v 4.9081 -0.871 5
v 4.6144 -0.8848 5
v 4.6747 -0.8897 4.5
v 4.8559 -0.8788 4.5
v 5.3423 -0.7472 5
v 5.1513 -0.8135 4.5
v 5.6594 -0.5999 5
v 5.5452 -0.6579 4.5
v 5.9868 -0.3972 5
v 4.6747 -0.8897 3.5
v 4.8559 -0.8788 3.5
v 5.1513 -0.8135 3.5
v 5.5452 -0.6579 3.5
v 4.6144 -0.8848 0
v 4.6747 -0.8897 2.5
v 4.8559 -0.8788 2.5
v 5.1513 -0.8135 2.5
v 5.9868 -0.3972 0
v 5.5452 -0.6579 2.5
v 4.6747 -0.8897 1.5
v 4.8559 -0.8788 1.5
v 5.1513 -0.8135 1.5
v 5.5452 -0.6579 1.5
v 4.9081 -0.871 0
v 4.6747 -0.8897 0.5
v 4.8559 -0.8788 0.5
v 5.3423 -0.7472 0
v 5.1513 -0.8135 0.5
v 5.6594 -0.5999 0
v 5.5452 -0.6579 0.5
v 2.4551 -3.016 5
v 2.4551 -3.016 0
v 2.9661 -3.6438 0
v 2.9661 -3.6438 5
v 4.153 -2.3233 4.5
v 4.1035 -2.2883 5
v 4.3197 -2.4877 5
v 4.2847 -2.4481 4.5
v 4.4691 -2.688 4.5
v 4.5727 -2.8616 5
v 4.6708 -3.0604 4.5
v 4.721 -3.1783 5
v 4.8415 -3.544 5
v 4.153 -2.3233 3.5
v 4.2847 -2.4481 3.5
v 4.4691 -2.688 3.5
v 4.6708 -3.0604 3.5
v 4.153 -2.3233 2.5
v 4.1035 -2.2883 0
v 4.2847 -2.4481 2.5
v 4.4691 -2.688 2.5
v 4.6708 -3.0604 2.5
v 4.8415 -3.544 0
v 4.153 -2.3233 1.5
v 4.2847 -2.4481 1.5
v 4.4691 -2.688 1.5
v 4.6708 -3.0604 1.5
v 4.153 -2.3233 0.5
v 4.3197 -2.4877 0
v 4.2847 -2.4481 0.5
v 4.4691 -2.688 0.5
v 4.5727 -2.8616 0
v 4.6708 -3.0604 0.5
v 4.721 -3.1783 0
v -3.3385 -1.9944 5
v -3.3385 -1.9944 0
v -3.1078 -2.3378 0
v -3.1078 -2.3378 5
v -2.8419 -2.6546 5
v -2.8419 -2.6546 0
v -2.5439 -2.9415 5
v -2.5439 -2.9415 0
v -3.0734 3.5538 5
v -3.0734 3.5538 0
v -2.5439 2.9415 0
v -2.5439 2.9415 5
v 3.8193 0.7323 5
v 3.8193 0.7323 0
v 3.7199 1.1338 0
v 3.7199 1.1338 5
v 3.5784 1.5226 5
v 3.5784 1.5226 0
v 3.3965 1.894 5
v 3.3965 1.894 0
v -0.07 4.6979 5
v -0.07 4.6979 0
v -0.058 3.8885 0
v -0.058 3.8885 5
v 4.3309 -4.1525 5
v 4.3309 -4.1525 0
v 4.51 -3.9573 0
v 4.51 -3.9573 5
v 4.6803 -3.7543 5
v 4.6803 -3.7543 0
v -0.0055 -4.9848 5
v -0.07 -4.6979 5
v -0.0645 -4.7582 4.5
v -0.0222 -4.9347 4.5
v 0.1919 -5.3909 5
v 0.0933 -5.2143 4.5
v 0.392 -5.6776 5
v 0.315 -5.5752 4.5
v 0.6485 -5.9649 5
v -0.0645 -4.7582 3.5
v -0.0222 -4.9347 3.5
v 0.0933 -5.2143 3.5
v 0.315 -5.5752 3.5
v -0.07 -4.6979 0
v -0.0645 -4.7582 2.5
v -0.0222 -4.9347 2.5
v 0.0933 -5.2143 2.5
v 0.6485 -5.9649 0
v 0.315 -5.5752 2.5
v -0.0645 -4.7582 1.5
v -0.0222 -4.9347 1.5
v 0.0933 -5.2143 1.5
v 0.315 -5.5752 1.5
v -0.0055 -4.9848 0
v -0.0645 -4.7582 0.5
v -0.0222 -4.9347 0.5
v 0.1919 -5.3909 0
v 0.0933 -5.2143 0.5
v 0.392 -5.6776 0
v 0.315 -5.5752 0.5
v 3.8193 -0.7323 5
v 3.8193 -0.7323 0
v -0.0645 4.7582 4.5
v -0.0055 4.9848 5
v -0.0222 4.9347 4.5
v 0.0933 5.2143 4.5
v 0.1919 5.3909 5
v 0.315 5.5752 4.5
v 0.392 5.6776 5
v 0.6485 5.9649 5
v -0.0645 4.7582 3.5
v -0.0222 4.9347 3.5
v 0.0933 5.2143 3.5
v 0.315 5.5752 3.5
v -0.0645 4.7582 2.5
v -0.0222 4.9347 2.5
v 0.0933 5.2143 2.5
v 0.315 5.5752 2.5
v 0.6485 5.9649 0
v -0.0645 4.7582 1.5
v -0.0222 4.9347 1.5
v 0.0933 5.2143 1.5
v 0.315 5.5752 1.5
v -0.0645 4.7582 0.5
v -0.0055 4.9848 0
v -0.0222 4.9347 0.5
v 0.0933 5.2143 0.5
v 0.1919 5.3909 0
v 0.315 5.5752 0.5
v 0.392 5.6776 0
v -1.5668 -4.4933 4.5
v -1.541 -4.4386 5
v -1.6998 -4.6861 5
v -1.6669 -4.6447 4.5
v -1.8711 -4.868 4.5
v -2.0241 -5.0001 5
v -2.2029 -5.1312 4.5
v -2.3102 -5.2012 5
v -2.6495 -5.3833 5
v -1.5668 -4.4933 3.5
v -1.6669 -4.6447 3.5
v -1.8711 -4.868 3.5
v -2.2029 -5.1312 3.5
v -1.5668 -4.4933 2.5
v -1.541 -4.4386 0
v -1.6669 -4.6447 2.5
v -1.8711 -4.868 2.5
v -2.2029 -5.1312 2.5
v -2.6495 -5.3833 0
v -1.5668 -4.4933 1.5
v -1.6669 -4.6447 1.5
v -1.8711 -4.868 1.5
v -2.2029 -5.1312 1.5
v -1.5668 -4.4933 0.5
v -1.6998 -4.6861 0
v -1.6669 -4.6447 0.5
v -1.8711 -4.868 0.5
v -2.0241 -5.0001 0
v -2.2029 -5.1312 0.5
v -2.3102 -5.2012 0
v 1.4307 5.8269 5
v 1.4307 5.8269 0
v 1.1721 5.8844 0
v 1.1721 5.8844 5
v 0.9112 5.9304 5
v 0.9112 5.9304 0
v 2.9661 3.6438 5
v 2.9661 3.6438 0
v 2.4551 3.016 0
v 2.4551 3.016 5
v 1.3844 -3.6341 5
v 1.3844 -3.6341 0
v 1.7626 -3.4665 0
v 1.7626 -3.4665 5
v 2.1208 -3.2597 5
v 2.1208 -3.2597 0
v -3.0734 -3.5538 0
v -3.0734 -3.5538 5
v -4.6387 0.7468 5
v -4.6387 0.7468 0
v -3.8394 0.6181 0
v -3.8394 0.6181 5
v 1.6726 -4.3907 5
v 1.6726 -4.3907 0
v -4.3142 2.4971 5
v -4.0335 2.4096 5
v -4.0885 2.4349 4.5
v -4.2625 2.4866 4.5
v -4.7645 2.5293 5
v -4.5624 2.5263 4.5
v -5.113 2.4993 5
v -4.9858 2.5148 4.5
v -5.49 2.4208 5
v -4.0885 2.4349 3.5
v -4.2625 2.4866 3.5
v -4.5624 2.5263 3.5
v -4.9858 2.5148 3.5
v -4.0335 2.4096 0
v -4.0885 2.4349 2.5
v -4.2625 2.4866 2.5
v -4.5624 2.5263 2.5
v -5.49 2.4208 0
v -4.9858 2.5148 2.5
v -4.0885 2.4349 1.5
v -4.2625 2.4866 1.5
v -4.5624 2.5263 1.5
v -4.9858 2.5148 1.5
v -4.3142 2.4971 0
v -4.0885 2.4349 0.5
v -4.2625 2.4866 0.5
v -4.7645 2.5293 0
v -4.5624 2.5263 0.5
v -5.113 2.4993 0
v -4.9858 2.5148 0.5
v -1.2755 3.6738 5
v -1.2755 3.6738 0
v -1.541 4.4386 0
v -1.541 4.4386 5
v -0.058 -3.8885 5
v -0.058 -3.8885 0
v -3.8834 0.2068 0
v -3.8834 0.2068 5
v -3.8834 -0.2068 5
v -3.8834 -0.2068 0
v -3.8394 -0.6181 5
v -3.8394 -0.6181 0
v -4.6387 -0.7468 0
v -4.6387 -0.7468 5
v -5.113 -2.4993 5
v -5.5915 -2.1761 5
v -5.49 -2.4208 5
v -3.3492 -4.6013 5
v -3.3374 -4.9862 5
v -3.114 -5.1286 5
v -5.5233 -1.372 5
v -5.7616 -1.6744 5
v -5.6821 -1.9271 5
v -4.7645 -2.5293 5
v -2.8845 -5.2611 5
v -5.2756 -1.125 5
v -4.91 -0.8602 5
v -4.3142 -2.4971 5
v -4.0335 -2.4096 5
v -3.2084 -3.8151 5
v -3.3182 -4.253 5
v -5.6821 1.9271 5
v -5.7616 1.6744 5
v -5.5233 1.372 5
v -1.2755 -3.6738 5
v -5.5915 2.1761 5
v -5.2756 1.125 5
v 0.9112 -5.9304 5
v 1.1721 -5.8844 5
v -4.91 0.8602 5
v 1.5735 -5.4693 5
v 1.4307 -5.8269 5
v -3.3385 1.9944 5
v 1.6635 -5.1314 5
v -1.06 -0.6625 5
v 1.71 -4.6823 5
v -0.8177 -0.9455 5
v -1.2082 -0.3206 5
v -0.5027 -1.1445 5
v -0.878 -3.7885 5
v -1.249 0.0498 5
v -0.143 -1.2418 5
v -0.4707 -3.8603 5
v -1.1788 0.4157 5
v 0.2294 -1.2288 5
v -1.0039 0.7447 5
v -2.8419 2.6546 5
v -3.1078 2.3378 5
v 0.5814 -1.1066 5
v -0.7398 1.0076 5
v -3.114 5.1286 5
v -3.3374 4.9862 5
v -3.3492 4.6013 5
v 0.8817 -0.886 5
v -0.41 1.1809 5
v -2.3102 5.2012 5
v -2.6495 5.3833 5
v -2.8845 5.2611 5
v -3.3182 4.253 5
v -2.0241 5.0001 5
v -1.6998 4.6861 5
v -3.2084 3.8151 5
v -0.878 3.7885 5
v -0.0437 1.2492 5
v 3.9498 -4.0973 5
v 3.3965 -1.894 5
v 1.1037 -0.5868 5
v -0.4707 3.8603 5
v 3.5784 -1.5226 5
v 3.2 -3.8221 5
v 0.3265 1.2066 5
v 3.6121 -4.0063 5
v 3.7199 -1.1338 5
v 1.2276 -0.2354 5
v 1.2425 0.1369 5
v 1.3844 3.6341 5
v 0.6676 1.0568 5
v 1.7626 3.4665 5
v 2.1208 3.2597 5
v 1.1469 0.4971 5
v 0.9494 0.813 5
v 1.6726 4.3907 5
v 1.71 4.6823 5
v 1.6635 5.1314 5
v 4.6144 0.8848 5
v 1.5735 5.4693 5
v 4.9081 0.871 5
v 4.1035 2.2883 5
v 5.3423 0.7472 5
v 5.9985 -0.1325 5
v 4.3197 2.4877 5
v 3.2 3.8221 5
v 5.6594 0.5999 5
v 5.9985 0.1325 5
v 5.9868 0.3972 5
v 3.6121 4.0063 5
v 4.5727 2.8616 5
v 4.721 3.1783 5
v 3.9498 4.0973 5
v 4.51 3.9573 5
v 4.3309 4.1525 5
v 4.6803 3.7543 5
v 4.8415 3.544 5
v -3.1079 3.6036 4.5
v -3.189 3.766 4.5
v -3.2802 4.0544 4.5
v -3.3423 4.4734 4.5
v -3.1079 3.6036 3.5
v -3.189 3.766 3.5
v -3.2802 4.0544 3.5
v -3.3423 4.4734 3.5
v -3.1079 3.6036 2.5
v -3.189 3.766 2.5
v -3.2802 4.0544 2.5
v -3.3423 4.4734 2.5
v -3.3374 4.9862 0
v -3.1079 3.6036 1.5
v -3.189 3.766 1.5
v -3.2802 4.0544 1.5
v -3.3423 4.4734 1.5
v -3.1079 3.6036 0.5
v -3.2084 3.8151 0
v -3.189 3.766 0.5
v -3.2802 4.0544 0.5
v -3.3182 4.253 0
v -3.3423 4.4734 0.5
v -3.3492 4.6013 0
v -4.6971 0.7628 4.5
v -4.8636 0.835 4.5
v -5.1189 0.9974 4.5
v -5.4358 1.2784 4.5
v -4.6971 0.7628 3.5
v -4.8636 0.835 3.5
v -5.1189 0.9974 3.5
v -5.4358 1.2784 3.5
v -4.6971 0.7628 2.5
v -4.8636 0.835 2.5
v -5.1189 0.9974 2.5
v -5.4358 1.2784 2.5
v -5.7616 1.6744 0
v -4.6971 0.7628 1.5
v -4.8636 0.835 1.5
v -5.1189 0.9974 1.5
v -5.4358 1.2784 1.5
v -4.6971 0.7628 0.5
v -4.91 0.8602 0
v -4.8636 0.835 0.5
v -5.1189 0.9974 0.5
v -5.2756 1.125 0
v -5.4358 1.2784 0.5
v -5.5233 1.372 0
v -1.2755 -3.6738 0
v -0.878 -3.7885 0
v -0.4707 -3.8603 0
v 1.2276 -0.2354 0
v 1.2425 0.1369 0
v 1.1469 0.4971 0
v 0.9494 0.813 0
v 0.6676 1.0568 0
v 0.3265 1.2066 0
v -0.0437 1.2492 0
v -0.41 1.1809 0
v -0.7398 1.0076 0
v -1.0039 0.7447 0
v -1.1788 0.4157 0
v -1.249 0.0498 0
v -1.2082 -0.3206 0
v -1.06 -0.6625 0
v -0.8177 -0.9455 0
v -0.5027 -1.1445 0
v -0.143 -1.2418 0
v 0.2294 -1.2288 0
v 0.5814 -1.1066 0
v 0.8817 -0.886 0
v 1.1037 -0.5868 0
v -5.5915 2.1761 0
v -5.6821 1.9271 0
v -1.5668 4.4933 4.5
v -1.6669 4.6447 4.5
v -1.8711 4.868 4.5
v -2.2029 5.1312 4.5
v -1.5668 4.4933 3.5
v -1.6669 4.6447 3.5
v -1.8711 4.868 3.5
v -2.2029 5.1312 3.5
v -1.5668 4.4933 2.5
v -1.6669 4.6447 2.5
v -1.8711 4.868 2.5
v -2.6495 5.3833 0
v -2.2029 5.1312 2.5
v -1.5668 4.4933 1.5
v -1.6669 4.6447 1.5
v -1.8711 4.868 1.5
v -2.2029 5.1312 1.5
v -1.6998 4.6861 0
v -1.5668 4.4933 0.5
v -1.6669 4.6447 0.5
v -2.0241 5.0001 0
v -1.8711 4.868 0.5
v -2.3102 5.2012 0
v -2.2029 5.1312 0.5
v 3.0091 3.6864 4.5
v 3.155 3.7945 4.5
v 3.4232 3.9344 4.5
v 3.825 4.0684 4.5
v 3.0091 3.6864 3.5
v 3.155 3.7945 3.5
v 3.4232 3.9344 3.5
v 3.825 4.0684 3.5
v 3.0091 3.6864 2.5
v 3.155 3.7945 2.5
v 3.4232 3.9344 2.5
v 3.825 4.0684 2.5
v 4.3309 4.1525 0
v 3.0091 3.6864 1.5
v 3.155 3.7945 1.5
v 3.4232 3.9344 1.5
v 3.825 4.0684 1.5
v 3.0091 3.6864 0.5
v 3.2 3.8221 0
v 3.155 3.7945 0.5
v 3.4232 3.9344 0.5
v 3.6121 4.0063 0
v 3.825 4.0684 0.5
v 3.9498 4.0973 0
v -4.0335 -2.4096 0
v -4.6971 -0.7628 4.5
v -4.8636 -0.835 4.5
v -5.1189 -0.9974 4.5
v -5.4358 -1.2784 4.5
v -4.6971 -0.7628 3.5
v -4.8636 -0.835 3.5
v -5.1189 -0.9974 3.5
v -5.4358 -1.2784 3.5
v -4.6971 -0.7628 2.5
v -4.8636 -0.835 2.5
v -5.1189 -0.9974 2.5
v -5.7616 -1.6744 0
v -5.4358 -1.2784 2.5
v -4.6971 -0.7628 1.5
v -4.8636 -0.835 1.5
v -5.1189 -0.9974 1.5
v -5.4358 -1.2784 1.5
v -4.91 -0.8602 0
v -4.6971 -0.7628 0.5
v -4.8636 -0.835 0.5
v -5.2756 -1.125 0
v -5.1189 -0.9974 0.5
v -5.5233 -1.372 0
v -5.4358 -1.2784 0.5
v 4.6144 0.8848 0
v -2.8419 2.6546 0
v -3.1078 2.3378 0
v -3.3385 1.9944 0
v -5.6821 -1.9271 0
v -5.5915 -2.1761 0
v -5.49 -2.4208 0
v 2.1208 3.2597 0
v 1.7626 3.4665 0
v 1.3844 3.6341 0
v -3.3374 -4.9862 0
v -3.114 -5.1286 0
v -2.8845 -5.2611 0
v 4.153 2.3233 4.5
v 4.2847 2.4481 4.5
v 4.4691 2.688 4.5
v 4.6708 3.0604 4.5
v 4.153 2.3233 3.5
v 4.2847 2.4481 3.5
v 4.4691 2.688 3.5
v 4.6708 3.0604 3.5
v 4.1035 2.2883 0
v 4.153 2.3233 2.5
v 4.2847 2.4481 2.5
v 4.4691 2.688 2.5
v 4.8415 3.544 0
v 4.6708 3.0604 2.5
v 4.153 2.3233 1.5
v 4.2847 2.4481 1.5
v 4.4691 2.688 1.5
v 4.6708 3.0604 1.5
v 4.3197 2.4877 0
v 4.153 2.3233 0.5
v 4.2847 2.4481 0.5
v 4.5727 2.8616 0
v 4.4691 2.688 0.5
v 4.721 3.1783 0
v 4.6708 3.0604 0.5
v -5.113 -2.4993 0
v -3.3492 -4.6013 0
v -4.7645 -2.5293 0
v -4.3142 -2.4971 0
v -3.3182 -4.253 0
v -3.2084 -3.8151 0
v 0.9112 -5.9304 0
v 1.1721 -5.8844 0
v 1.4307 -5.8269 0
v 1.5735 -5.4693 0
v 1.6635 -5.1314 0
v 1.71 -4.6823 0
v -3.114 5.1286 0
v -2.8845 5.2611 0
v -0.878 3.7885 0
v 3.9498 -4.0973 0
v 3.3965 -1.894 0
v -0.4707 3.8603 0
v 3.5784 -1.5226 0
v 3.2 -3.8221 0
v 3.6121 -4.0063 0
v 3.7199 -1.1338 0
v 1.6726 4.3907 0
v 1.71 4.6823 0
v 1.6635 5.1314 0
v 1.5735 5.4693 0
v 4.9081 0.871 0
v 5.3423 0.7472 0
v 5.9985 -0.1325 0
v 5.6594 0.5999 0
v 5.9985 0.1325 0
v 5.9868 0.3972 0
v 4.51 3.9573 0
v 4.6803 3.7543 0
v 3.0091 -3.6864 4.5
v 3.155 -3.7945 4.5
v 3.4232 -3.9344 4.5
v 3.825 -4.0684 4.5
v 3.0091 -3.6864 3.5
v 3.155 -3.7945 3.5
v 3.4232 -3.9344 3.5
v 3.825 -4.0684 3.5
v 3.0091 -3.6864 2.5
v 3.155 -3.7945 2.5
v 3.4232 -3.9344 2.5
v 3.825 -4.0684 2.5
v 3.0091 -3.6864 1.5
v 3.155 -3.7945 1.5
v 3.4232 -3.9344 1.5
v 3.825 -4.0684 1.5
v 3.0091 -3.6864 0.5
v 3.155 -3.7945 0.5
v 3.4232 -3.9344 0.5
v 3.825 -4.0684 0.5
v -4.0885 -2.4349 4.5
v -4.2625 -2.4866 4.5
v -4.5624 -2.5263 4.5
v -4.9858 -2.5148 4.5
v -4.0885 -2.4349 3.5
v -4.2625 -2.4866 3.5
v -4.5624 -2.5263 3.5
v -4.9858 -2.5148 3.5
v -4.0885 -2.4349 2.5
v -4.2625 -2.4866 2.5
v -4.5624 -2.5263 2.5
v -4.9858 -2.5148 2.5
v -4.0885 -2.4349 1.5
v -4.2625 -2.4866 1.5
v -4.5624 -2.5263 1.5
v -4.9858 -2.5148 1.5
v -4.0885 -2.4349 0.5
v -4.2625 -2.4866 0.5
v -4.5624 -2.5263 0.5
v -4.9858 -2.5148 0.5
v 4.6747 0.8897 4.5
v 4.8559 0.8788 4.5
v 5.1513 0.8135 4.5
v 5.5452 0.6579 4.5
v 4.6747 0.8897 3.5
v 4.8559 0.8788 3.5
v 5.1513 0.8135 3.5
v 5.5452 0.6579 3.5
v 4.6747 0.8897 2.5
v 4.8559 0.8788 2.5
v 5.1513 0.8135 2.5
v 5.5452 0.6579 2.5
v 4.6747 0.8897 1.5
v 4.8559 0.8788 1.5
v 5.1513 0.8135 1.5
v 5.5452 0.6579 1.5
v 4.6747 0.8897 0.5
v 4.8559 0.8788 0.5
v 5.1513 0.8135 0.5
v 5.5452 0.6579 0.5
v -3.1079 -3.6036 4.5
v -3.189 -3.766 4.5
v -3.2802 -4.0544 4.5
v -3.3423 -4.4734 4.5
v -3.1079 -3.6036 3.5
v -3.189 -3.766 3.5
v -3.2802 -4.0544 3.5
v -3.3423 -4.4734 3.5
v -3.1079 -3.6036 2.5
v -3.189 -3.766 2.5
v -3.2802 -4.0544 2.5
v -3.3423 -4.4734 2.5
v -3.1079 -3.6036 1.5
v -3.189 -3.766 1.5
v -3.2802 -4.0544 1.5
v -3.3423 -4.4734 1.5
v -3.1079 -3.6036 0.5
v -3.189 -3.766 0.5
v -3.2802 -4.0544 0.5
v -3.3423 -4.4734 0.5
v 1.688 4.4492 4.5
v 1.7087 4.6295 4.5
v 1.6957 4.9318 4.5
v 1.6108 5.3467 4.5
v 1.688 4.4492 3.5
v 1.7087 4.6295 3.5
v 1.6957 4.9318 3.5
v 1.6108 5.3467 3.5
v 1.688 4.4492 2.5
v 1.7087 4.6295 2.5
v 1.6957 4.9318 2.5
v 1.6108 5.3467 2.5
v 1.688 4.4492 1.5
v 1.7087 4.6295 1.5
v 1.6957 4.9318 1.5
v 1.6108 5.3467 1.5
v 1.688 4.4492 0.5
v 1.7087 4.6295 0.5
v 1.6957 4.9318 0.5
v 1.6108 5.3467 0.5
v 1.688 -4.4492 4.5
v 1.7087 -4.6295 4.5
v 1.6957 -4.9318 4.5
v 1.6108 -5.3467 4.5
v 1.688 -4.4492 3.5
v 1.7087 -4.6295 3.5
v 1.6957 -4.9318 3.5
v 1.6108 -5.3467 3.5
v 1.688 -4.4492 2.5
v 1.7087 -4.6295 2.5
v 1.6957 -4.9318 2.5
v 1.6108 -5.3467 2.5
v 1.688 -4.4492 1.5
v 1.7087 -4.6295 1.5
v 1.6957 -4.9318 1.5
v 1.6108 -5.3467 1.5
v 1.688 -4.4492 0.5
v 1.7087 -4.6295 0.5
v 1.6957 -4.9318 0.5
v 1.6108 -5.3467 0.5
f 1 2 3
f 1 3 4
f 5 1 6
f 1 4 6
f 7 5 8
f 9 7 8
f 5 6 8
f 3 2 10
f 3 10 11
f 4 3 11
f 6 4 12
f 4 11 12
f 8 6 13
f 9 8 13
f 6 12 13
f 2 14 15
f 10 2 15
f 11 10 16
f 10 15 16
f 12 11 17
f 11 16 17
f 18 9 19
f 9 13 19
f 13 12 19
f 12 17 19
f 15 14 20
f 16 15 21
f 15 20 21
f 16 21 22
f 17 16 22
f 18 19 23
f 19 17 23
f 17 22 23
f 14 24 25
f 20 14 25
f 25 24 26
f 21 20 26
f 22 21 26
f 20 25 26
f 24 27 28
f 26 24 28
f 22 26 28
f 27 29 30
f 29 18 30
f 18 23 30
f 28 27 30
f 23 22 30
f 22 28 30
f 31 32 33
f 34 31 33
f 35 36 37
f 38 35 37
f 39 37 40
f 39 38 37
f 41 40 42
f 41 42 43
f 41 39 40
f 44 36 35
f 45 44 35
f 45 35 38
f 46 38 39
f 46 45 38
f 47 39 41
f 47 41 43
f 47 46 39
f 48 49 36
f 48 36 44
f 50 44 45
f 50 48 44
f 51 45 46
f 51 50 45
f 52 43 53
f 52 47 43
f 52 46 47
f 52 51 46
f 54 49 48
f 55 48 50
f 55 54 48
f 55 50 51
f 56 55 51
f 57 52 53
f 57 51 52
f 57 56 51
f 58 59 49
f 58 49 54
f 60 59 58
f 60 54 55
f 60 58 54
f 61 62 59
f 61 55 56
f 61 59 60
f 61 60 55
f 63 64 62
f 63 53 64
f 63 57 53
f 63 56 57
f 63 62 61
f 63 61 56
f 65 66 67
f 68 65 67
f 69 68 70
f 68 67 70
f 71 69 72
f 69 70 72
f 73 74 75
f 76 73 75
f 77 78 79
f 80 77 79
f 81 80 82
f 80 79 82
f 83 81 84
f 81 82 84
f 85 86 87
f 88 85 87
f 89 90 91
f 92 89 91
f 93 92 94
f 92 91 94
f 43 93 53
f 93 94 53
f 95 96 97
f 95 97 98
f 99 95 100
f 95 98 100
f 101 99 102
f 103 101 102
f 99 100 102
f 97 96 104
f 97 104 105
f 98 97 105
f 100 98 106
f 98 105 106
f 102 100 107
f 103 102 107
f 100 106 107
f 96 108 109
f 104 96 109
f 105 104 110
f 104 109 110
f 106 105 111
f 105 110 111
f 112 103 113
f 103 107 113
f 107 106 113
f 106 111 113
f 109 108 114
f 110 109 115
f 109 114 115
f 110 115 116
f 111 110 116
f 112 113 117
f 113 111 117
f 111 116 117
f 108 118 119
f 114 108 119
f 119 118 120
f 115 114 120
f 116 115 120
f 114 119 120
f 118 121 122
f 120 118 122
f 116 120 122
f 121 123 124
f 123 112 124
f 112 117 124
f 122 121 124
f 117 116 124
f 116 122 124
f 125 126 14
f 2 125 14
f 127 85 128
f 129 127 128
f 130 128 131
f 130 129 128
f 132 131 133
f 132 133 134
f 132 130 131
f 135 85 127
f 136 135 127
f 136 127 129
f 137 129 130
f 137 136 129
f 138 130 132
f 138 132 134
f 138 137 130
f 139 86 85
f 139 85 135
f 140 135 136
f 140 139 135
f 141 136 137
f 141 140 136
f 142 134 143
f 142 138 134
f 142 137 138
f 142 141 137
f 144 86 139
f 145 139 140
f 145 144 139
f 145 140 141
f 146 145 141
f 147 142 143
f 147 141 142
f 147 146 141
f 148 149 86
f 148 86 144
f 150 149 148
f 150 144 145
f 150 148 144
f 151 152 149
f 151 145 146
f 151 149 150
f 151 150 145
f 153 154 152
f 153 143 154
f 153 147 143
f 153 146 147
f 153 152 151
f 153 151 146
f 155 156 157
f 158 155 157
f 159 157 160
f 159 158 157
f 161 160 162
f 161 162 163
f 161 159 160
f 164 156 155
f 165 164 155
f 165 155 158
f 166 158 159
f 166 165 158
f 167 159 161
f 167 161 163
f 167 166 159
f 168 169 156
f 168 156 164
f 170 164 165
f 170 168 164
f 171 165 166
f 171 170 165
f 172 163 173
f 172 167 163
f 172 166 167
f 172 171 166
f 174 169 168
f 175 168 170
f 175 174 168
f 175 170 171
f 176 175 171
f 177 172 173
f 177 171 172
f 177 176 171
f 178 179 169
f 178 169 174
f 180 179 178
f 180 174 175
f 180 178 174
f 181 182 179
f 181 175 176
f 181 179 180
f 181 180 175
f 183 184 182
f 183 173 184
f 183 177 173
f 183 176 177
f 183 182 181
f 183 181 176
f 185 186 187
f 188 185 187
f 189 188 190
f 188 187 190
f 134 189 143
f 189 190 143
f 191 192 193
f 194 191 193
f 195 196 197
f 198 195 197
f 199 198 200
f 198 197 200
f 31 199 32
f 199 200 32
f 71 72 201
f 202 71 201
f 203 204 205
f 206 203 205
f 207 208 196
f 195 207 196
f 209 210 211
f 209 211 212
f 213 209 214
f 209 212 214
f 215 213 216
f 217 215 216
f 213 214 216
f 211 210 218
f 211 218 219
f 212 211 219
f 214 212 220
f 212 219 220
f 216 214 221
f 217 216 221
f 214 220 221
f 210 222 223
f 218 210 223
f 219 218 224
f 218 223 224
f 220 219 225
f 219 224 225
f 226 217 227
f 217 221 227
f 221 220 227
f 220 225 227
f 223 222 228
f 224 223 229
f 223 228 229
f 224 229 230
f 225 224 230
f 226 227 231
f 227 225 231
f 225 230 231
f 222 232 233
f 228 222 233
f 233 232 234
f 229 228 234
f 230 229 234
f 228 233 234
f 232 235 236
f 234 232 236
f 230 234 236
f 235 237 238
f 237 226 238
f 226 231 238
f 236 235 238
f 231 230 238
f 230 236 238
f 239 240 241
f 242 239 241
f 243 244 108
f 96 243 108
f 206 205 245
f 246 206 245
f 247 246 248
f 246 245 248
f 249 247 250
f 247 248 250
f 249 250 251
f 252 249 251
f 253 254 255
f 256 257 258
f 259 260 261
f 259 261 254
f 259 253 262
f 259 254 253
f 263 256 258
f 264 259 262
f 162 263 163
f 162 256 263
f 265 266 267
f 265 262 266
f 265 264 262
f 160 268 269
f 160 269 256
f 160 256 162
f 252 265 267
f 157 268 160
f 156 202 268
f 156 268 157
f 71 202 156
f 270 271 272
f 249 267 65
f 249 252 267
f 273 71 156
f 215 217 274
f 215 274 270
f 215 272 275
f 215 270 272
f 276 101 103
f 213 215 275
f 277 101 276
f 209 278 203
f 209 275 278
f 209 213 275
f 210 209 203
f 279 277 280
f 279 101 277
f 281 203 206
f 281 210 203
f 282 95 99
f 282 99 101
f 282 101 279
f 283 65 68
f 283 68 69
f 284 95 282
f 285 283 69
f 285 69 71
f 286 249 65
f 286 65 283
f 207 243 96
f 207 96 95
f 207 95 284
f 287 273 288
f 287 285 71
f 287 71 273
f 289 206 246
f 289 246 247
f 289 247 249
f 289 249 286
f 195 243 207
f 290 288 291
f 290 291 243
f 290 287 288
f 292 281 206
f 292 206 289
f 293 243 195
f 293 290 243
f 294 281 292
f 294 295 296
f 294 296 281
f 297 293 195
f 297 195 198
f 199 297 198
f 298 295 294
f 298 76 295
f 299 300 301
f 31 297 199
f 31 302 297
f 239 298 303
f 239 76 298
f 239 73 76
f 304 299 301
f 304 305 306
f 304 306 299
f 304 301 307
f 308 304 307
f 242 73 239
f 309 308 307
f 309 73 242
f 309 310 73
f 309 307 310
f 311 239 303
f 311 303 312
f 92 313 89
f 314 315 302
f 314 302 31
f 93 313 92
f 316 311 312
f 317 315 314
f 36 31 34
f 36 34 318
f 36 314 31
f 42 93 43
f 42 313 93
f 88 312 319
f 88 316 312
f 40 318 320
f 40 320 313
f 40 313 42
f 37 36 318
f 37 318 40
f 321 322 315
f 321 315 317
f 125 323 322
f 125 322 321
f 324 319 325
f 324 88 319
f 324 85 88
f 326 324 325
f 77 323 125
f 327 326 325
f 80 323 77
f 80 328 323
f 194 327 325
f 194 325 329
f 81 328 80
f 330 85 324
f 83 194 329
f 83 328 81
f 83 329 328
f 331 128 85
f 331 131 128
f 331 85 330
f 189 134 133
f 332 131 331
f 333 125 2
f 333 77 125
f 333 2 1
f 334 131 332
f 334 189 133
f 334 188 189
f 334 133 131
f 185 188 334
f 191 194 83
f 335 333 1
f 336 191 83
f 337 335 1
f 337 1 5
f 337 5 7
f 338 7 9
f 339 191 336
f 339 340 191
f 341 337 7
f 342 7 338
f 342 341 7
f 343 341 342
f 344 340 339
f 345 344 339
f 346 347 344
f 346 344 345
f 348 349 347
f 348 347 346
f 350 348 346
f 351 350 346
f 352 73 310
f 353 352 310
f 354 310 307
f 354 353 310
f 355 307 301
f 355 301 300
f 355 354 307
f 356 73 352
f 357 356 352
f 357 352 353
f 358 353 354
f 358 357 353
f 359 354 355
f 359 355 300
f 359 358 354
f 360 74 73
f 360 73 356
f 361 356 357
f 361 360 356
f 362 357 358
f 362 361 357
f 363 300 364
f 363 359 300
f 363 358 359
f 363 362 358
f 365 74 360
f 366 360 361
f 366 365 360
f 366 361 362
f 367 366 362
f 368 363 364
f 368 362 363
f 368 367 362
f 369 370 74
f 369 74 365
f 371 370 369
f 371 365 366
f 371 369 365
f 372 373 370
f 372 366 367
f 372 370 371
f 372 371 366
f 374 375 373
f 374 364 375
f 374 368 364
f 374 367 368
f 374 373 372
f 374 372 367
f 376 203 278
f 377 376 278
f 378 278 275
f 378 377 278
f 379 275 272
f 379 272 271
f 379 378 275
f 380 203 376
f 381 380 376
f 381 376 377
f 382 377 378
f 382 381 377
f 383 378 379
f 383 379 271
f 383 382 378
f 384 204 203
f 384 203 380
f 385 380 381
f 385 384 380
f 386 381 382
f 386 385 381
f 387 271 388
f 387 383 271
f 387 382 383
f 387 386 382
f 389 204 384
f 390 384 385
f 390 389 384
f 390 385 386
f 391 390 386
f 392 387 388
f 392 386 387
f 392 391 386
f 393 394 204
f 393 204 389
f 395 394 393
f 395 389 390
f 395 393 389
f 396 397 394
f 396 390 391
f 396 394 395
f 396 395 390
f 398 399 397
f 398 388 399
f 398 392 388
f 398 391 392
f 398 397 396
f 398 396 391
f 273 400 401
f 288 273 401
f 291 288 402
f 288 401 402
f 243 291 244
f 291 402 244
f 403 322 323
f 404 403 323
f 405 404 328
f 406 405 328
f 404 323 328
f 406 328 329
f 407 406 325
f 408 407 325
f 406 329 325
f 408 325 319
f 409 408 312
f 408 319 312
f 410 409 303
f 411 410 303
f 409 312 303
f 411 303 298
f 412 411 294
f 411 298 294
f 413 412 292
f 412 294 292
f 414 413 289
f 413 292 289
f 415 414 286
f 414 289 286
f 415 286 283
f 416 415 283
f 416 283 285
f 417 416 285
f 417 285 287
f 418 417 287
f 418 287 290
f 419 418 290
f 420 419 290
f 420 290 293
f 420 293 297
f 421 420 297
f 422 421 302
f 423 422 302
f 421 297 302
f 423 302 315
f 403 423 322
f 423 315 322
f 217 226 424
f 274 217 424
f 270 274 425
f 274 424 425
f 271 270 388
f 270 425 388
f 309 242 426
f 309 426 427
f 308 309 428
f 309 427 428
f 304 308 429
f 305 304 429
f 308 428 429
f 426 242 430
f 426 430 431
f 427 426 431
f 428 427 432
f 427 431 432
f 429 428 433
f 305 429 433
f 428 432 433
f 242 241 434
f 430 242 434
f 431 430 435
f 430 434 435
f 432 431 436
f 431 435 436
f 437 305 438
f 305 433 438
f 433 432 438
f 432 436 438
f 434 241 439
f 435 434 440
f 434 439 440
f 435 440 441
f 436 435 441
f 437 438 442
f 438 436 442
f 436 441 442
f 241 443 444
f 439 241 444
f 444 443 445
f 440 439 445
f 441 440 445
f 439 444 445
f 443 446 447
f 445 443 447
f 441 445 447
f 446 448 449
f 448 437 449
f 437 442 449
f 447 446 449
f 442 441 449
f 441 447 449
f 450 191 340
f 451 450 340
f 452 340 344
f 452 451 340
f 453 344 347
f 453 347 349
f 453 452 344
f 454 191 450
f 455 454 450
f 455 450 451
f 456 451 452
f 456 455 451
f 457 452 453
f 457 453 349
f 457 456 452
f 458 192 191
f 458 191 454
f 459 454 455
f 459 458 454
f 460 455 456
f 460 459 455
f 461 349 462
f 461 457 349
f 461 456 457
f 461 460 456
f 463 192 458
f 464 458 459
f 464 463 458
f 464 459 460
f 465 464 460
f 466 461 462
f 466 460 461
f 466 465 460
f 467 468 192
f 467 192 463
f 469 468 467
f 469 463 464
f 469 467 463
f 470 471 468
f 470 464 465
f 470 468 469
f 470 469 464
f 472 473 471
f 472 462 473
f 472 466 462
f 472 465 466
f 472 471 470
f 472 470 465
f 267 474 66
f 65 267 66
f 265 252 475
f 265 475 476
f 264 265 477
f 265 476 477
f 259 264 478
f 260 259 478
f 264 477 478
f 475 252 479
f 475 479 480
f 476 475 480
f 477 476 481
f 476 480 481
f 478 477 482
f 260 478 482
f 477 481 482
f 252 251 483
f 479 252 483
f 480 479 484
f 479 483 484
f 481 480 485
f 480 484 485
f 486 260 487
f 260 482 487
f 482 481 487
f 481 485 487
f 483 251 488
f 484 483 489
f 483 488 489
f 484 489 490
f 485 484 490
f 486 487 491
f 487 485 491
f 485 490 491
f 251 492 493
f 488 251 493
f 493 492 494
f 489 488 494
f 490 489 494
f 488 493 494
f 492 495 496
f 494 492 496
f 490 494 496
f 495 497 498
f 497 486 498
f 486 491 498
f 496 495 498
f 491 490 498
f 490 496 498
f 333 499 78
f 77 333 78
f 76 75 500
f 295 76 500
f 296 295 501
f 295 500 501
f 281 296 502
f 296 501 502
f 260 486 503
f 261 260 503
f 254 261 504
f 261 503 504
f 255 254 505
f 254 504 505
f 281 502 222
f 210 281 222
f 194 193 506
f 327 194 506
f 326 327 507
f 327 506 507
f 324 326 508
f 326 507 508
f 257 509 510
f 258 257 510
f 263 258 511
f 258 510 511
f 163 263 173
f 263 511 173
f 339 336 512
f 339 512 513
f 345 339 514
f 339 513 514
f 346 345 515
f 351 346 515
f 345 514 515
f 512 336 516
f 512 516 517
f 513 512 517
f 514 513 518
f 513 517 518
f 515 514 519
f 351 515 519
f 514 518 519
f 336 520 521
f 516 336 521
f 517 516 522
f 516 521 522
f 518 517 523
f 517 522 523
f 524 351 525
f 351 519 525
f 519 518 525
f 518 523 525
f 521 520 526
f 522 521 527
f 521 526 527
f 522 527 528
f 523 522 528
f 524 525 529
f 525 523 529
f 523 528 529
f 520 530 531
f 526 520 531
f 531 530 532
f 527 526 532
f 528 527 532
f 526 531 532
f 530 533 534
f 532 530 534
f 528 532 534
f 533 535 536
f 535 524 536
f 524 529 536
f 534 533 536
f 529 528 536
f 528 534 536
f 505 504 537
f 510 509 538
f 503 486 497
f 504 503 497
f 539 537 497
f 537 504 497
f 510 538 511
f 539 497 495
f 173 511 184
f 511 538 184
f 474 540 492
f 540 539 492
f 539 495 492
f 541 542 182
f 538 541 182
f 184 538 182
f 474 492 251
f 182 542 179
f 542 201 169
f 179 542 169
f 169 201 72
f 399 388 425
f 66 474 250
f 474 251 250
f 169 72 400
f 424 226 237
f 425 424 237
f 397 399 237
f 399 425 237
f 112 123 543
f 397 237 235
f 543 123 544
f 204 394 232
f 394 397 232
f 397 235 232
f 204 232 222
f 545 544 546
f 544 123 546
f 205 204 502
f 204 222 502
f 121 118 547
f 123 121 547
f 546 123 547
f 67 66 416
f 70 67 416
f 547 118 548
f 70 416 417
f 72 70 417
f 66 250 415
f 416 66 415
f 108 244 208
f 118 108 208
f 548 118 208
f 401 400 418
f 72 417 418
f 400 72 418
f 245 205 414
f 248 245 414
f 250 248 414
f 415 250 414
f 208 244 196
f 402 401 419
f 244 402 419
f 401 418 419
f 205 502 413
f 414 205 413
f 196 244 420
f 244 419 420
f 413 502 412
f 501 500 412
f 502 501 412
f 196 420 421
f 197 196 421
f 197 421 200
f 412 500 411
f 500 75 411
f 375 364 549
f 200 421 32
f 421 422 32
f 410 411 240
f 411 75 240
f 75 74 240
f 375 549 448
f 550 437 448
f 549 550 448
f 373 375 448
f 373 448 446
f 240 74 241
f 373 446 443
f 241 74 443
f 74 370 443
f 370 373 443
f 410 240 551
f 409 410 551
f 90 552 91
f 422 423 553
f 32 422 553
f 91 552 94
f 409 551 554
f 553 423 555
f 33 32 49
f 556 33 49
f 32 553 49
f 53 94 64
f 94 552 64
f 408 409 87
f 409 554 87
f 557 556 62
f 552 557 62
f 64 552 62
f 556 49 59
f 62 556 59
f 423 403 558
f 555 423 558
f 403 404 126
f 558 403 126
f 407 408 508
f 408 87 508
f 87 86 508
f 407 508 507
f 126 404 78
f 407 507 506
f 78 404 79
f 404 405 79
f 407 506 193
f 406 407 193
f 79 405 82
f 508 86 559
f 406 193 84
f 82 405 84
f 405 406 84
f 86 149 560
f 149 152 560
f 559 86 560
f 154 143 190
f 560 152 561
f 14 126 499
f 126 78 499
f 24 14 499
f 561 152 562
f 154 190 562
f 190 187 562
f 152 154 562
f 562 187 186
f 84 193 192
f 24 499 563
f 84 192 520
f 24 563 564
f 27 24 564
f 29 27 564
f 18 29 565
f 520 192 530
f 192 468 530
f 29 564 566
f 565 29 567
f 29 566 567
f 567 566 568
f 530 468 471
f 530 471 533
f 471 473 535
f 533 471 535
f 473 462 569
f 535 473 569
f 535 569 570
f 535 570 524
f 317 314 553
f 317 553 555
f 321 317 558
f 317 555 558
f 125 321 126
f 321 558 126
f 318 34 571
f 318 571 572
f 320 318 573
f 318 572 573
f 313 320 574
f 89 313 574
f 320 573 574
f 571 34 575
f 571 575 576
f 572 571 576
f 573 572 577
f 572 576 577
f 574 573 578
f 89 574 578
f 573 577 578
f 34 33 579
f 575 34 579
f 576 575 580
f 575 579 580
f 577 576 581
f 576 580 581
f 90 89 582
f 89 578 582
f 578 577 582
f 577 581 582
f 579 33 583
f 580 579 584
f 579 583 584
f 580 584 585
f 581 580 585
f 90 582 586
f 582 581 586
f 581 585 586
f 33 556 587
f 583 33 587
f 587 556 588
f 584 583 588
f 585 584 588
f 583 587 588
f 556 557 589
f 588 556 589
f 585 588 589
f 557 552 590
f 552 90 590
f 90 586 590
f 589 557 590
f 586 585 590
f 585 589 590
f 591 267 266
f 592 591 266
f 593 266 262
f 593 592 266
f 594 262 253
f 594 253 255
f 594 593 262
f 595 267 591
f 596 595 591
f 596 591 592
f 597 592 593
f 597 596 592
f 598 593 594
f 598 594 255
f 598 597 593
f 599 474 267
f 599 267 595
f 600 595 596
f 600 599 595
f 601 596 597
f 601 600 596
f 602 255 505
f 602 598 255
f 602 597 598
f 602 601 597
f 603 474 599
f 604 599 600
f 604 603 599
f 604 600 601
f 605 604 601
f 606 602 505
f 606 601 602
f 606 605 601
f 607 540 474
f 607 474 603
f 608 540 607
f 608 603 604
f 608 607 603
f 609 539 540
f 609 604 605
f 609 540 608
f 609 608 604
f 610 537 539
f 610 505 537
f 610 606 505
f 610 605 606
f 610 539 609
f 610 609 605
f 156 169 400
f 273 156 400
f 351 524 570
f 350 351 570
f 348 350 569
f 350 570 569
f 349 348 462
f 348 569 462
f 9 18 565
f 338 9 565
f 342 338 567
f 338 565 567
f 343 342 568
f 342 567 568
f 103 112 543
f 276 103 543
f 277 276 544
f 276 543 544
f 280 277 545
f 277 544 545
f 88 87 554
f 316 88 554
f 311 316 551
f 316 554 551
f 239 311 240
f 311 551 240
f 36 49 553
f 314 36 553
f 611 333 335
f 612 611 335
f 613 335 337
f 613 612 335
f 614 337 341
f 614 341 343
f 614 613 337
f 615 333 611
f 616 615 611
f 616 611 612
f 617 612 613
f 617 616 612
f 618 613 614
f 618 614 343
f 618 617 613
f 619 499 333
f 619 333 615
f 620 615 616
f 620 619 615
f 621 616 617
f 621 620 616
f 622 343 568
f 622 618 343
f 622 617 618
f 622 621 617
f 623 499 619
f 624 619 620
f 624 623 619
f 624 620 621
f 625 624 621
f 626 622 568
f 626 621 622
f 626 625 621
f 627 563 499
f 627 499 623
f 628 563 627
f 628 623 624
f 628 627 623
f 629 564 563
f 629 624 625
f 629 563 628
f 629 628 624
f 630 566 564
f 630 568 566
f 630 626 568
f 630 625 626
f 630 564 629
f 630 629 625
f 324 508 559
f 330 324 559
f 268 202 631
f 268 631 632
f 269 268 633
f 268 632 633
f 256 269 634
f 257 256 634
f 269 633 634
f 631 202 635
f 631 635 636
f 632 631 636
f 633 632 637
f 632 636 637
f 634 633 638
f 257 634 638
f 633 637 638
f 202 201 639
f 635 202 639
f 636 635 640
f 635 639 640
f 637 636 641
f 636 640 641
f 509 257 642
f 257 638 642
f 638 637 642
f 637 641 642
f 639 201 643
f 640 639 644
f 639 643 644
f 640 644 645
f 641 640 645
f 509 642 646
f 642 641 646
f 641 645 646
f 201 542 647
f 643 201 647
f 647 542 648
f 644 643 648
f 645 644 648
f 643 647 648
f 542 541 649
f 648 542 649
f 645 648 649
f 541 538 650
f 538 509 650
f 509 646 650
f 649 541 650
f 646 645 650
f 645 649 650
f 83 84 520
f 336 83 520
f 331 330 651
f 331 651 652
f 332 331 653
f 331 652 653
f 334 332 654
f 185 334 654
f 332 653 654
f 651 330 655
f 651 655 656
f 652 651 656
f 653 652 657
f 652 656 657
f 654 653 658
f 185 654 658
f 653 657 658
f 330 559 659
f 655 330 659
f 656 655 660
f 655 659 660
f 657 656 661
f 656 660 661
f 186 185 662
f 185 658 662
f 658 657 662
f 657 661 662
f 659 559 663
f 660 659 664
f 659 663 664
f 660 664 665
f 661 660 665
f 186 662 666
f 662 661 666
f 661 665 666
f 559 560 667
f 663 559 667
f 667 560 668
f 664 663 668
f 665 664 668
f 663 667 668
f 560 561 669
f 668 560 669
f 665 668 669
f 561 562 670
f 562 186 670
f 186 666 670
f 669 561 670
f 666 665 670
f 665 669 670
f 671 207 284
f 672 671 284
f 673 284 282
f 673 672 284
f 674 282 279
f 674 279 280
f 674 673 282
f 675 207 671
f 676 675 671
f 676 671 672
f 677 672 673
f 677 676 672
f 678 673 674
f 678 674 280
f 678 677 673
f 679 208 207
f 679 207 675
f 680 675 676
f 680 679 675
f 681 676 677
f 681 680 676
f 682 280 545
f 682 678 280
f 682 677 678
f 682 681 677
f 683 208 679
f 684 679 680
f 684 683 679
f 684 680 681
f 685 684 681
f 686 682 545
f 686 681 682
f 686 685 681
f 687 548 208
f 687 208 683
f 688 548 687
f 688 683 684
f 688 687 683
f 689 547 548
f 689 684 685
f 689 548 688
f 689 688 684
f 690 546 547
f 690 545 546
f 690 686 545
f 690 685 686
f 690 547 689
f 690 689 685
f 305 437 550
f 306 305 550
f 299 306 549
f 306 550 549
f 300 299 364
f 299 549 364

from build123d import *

# Parameters (mm, degrees)
F2_DEPTH = 5
F3_COUNT = 9
F4_R     = 1.25
F5_DEPTH = 5
F6_ANGLE = -10.85395829


with BuildPart() as f2:
    # F0 (on Top) → F2 (new body)
    with BuildSketch(Plane.XY):
        with BuildLine():
            ThreePointArc((3.6130946236, 1.4384032925), (-3.8193180234, -0.7323022786), (3.888888889, 0))
            ThreePointArc((3.888888889, 0), (3.8193180234, 0.7323022786), (3.6130946236, 1.4384032925))
        make_face()
        with BuildLine():
            ThreePointArc((3.6130946236, 1.4384032925), (3.8193180234, 0.7323022786), (3.888888889, 0))
            Line((3.888888889, 0), (4.698463104, 0))
            add(Edge.make_bspline(
                [(4.698463104, 0), (4.7049792483, 0), (4.7132233908, 0.0006842948), (4.763050157, 0.0061225393), (4.8350485603, 0.0212028992), (4.9376742279, 0.050620519), (5.0649928014, 0.098810981), (5.2157995796, 0.170113939), (5.3864295271, 0.2680459384), (5.5743056682, 0.3979334197), (5.7639316145, 0.549288566), (5.8961218075, 0.6803639178), (5.95452699, 0.7372979895)],
                knots=[0, 0, 0, 0, 0.0334562722, 0.0914019297, 0.1662092137, 0.2547223082, 0.3550866872, 0.4660436628, 0.5866665998, 0.7162364101, 0.8541740006, 0.983034796, 0.983034796, 0.983034796, 0.983034796], degree=3))
            ThreePointArc((5.95452699, 0.7372979895), (5.8926620931, 1.1298378012), (5.8049489079, 1.5174215552))
            add(Edge.make_bspline(
                [(4.3652550291, 1.7378446624), (4.3713090581, 1.7402548222), (4.3792216418, 1.7426683598), (4.4275262385, 1.7560454694), (4.4999964714, 1.7686650053), (4.6062249239, 1.7792923221), (4.7423387055, 1.7816114308), (4.9088236804, 1.7711448505), (5.1035754149, 1.7432698185), (5.3261698064, 1.6920844784), (5.5583302651, 1.6216011379), (5.7296272375, 1.5487153218), (5.8049489079, 1.5174215552)],
                knots=[0, 0, 0, 0, 0.0334562722, 0.0914019297, 0.1662092137, 0.2547223082, 0.3550866872, 0.4660436628, 0.5866665998, 0.7162364101, 0.8541740006, 0.983034796, 0.983034796, 0.983034796, 0.983034796], degree=3))
            Line((4.3652550291, 1.7378446624), (3.6130946236, 1.4384032925))
        make_face()
    extrude(amount=F2_DEPTH)

    # F3: F2 ×9 about axis
    f3_axis = Axis((0, 0, 10.5789164081), (0, 0, 1))


with BuildPart() as f2_1:
    add(f2.part)
    for i in range(1, F3_COUNT):
        add(f2.part.rotate(f3_axis, i * 360 / F3_COUNT))

    # F4 (on face) → F5 (cut, through all)
    with BuildSketch(Plane.XY.offset(5)):
        Circle(F4_R)
    extrude(amount=-F5_DEPTH, mode=Mode.SUBTRACT)


with BuildPart() as f2_2:
    # F6: moved
    add(f2_1.part.rotate(Axis((0, 0, 10.5789164081), (0, 0, 1)), F6_ANGLE))


solid = f2_2.part
